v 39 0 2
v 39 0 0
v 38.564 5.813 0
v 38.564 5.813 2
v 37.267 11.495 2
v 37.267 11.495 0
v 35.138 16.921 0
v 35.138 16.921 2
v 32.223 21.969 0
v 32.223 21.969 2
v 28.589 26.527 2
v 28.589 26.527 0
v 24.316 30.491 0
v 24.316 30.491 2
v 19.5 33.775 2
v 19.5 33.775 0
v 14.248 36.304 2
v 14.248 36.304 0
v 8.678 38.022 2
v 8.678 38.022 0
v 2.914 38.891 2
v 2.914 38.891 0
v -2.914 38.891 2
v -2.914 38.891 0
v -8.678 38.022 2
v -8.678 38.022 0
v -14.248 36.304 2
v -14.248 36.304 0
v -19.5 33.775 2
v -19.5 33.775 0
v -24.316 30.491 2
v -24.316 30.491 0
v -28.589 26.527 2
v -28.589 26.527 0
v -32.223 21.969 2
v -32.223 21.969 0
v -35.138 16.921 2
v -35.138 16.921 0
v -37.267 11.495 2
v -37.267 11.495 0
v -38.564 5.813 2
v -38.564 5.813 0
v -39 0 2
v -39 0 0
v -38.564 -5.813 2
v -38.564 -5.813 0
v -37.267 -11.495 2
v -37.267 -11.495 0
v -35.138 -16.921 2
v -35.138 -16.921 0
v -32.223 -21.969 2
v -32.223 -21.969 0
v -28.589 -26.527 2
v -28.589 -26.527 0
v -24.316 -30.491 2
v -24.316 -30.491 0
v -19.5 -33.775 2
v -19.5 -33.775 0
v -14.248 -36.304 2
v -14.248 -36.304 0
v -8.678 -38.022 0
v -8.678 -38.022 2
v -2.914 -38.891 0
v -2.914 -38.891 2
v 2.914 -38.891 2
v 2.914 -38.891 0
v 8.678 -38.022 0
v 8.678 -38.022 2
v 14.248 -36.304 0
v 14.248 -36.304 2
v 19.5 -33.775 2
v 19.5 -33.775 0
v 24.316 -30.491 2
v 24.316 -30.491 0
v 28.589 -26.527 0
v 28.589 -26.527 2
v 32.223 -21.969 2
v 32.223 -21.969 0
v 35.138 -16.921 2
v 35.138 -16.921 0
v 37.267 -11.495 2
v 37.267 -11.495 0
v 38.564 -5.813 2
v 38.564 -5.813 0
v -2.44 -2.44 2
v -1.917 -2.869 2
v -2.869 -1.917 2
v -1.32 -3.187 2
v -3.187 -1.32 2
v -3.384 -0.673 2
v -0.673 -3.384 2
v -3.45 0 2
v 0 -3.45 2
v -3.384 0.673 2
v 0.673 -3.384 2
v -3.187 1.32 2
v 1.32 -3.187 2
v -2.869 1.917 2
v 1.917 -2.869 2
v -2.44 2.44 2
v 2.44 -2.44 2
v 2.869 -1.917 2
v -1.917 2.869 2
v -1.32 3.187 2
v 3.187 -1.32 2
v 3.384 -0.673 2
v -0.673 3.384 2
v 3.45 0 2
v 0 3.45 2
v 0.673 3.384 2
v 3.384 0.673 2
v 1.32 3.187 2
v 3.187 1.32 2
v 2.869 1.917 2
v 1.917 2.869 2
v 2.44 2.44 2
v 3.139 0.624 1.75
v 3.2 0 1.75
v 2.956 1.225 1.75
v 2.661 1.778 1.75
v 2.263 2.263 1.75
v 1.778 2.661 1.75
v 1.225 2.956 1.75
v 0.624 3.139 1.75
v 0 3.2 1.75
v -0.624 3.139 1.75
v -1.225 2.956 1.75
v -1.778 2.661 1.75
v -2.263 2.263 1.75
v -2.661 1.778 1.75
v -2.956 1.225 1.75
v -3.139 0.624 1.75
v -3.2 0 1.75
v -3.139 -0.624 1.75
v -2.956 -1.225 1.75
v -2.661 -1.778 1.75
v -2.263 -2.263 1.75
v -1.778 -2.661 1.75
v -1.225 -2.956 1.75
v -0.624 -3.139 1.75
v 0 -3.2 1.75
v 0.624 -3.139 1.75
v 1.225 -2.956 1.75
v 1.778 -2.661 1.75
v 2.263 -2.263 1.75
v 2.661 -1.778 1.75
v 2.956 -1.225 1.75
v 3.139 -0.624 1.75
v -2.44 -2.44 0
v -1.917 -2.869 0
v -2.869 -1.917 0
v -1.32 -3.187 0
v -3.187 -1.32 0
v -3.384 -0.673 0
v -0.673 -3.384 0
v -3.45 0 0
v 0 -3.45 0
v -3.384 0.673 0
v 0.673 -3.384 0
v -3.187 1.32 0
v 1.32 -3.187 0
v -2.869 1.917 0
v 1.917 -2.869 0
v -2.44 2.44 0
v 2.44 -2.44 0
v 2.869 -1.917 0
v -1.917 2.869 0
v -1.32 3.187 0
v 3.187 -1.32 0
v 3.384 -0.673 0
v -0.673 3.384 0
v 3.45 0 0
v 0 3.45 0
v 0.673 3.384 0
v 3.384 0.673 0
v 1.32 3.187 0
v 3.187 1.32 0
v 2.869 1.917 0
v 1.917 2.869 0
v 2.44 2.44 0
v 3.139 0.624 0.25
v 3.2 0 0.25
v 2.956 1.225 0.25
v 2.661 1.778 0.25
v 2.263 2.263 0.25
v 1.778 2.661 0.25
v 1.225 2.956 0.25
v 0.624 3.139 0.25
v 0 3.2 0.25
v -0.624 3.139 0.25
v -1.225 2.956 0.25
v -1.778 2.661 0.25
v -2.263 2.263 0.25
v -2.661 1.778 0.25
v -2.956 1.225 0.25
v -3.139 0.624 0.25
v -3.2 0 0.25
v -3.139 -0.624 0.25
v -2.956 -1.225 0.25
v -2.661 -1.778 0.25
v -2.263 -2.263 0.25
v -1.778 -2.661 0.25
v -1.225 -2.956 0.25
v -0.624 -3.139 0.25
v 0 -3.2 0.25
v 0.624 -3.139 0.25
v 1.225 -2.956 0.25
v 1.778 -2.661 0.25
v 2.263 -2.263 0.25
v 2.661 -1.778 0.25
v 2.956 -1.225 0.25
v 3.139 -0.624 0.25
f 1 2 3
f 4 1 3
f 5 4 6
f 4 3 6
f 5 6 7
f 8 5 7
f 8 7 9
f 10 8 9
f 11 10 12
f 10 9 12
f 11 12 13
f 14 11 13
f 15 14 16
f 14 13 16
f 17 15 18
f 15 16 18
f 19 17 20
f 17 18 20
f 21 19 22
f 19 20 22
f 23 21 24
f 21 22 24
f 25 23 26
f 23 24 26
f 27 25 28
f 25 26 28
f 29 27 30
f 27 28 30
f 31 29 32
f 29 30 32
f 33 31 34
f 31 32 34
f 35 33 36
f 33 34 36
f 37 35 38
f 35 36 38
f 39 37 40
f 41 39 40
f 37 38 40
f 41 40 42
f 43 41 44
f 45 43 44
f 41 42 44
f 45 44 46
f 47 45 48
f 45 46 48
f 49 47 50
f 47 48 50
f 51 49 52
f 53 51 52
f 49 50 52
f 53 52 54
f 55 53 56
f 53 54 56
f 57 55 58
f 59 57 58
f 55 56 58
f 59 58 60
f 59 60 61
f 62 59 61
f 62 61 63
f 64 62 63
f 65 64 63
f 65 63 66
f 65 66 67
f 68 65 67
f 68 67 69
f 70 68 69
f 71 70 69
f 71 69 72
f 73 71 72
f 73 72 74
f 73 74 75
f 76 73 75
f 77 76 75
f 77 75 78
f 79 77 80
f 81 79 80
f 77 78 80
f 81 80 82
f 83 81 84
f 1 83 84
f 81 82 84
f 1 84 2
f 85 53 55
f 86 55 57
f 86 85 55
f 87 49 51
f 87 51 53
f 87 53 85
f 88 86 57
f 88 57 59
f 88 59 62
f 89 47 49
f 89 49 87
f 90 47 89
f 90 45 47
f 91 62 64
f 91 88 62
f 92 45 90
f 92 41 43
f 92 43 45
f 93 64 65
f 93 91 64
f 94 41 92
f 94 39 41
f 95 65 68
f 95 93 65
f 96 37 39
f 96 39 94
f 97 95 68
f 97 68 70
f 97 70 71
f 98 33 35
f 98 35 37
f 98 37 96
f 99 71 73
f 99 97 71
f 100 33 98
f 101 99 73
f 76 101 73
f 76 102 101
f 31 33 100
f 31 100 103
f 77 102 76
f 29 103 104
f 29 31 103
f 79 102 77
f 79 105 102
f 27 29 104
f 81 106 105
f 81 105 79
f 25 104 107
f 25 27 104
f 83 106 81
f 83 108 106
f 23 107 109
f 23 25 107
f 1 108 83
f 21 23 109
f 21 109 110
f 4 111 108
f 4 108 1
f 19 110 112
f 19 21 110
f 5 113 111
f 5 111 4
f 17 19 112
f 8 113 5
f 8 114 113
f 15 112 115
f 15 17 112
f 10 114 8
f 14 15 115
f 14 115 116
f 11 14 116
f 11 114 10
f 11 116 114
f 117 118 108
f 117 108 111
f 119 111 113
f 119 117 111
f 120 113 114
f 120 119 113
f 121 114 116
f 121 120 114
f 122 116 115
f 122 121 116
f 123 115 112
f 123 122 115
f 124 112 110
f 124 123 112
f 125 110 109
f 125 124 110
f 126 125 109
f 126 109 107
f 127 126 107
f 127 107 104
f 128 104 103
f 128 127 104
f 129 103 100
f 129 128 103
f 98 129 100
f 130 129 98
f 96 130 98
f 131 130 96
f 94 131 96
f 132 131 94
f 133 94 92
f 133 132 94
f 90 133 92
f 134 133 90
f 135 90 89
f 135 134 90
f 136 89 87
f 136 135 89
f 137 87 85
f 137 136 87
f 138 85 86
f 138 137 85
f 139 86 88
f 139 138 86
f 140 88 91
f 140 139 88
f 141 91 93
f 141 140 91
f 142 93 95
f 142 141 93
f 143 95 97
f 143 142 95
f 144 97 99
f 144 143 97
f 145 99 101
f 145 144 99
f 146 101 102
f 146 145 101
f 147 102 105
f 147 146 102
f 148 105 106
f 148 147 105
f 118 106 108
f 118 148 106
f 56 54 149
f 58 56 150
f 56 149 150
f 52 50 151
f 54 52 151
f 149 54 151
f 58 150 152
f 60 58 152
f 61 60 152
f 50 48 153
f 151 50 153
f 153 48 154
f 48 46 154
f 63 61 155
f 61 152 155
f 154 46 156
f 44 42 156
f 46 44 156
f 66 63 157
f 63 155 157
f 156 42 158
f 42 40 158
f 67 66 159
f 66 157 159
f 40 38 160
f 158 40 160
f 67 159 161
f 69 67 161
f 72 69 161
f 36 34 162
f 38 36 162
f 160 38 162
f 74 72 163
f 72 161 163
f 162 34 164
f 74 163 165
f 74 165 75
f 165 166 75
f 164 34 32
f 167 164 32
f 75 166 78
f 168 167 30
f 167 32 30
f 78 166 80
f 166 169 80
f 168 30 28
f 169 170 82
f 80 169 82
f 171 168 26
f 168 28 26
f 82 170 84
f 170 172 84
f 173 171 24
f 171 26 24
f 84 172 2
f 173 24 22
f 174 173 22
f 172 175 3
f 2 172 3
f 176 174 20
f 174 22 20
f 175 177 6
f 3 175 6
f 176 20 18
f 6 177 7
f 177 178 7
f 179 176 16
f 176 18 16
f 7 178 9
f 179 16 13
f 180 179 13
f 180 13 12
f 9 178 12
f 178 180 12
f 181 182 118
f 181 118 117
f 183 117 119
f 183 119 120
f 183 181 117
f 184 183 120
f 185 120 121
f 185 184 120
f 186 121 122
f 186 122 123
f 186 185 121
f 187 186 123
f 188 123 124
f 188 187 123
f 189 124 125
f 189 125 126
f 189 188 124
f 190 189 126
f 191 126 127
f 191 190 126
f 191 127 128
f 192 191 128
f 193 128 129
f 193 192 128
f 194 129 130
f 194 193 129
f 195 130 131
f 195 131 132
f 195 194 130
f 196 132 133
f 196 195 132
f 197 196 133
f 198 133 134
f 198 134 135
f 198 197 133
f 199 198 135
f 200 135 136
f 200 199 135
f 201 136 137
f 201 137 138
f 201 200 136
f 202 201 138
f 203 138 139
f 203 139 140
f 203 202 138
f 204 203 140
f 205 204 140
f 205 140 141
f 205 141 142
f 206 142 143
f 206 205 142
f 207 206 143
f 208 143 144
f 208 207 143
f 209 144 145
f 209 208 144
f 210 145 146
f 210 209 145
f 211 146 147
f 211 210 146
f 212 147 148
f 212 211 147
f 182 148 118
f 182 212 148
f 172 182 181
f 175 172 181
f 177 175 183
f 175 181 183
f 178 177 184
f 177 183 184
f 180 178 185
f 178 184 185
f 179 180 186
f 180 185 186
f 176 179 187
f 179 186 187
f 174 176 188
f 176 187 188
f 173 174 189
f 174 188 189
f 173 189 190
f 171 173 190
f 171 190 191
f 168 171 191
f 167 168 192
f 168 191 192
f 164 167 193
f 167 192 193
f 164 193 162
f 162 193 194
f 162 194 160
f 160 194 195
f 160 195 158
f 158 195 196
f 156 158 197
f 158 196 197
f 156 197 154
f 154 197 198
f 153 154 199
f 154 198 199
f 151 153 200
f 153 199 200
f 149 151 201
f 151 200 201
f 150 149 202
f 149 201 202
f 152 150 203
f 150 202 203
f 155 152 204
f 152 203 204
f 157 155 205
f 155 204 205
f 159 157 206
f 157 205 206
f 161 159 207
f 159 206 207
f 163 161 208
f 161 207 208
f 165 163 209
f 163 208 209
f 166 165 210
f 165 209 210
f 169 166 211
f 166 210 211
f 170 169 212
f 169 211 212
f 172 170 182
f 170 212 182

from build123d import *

# Parameters (mm, degrees)
SKETCH007_R     = 39
PAD002_DEPTH    = 2
SKETCH005_R     = 3.2
POCKET003_DEPTH = 2
CHAMFER001_SIZE = 0.25


with BuildPart() as part:
    # Sketch007 → Pad002 (new body)
    with BuildSketch(Plane.XY):
        Circle(SKETCH007_R)
    extrude(amount=PAD002_DEPTH)

    # Sketch005 → Pocket003 (cut)
    with BuildSketch(Plane.XY):
        Circle(SKETCH005_R)
    extrude(amount=POCKET003_DEPTH, mode=Mode.SUBTRACT)

    # Chamfer001
    chamfer001_edges = [part.edges().sort_by_distance(p)[0] for p in [
        (-3.2, 0, 2),
        (-3.2, 0, 0),
    ]]
    chamfer(chamfer001_edges, length=CHAMFER001_SIZE)


solid = part.part
